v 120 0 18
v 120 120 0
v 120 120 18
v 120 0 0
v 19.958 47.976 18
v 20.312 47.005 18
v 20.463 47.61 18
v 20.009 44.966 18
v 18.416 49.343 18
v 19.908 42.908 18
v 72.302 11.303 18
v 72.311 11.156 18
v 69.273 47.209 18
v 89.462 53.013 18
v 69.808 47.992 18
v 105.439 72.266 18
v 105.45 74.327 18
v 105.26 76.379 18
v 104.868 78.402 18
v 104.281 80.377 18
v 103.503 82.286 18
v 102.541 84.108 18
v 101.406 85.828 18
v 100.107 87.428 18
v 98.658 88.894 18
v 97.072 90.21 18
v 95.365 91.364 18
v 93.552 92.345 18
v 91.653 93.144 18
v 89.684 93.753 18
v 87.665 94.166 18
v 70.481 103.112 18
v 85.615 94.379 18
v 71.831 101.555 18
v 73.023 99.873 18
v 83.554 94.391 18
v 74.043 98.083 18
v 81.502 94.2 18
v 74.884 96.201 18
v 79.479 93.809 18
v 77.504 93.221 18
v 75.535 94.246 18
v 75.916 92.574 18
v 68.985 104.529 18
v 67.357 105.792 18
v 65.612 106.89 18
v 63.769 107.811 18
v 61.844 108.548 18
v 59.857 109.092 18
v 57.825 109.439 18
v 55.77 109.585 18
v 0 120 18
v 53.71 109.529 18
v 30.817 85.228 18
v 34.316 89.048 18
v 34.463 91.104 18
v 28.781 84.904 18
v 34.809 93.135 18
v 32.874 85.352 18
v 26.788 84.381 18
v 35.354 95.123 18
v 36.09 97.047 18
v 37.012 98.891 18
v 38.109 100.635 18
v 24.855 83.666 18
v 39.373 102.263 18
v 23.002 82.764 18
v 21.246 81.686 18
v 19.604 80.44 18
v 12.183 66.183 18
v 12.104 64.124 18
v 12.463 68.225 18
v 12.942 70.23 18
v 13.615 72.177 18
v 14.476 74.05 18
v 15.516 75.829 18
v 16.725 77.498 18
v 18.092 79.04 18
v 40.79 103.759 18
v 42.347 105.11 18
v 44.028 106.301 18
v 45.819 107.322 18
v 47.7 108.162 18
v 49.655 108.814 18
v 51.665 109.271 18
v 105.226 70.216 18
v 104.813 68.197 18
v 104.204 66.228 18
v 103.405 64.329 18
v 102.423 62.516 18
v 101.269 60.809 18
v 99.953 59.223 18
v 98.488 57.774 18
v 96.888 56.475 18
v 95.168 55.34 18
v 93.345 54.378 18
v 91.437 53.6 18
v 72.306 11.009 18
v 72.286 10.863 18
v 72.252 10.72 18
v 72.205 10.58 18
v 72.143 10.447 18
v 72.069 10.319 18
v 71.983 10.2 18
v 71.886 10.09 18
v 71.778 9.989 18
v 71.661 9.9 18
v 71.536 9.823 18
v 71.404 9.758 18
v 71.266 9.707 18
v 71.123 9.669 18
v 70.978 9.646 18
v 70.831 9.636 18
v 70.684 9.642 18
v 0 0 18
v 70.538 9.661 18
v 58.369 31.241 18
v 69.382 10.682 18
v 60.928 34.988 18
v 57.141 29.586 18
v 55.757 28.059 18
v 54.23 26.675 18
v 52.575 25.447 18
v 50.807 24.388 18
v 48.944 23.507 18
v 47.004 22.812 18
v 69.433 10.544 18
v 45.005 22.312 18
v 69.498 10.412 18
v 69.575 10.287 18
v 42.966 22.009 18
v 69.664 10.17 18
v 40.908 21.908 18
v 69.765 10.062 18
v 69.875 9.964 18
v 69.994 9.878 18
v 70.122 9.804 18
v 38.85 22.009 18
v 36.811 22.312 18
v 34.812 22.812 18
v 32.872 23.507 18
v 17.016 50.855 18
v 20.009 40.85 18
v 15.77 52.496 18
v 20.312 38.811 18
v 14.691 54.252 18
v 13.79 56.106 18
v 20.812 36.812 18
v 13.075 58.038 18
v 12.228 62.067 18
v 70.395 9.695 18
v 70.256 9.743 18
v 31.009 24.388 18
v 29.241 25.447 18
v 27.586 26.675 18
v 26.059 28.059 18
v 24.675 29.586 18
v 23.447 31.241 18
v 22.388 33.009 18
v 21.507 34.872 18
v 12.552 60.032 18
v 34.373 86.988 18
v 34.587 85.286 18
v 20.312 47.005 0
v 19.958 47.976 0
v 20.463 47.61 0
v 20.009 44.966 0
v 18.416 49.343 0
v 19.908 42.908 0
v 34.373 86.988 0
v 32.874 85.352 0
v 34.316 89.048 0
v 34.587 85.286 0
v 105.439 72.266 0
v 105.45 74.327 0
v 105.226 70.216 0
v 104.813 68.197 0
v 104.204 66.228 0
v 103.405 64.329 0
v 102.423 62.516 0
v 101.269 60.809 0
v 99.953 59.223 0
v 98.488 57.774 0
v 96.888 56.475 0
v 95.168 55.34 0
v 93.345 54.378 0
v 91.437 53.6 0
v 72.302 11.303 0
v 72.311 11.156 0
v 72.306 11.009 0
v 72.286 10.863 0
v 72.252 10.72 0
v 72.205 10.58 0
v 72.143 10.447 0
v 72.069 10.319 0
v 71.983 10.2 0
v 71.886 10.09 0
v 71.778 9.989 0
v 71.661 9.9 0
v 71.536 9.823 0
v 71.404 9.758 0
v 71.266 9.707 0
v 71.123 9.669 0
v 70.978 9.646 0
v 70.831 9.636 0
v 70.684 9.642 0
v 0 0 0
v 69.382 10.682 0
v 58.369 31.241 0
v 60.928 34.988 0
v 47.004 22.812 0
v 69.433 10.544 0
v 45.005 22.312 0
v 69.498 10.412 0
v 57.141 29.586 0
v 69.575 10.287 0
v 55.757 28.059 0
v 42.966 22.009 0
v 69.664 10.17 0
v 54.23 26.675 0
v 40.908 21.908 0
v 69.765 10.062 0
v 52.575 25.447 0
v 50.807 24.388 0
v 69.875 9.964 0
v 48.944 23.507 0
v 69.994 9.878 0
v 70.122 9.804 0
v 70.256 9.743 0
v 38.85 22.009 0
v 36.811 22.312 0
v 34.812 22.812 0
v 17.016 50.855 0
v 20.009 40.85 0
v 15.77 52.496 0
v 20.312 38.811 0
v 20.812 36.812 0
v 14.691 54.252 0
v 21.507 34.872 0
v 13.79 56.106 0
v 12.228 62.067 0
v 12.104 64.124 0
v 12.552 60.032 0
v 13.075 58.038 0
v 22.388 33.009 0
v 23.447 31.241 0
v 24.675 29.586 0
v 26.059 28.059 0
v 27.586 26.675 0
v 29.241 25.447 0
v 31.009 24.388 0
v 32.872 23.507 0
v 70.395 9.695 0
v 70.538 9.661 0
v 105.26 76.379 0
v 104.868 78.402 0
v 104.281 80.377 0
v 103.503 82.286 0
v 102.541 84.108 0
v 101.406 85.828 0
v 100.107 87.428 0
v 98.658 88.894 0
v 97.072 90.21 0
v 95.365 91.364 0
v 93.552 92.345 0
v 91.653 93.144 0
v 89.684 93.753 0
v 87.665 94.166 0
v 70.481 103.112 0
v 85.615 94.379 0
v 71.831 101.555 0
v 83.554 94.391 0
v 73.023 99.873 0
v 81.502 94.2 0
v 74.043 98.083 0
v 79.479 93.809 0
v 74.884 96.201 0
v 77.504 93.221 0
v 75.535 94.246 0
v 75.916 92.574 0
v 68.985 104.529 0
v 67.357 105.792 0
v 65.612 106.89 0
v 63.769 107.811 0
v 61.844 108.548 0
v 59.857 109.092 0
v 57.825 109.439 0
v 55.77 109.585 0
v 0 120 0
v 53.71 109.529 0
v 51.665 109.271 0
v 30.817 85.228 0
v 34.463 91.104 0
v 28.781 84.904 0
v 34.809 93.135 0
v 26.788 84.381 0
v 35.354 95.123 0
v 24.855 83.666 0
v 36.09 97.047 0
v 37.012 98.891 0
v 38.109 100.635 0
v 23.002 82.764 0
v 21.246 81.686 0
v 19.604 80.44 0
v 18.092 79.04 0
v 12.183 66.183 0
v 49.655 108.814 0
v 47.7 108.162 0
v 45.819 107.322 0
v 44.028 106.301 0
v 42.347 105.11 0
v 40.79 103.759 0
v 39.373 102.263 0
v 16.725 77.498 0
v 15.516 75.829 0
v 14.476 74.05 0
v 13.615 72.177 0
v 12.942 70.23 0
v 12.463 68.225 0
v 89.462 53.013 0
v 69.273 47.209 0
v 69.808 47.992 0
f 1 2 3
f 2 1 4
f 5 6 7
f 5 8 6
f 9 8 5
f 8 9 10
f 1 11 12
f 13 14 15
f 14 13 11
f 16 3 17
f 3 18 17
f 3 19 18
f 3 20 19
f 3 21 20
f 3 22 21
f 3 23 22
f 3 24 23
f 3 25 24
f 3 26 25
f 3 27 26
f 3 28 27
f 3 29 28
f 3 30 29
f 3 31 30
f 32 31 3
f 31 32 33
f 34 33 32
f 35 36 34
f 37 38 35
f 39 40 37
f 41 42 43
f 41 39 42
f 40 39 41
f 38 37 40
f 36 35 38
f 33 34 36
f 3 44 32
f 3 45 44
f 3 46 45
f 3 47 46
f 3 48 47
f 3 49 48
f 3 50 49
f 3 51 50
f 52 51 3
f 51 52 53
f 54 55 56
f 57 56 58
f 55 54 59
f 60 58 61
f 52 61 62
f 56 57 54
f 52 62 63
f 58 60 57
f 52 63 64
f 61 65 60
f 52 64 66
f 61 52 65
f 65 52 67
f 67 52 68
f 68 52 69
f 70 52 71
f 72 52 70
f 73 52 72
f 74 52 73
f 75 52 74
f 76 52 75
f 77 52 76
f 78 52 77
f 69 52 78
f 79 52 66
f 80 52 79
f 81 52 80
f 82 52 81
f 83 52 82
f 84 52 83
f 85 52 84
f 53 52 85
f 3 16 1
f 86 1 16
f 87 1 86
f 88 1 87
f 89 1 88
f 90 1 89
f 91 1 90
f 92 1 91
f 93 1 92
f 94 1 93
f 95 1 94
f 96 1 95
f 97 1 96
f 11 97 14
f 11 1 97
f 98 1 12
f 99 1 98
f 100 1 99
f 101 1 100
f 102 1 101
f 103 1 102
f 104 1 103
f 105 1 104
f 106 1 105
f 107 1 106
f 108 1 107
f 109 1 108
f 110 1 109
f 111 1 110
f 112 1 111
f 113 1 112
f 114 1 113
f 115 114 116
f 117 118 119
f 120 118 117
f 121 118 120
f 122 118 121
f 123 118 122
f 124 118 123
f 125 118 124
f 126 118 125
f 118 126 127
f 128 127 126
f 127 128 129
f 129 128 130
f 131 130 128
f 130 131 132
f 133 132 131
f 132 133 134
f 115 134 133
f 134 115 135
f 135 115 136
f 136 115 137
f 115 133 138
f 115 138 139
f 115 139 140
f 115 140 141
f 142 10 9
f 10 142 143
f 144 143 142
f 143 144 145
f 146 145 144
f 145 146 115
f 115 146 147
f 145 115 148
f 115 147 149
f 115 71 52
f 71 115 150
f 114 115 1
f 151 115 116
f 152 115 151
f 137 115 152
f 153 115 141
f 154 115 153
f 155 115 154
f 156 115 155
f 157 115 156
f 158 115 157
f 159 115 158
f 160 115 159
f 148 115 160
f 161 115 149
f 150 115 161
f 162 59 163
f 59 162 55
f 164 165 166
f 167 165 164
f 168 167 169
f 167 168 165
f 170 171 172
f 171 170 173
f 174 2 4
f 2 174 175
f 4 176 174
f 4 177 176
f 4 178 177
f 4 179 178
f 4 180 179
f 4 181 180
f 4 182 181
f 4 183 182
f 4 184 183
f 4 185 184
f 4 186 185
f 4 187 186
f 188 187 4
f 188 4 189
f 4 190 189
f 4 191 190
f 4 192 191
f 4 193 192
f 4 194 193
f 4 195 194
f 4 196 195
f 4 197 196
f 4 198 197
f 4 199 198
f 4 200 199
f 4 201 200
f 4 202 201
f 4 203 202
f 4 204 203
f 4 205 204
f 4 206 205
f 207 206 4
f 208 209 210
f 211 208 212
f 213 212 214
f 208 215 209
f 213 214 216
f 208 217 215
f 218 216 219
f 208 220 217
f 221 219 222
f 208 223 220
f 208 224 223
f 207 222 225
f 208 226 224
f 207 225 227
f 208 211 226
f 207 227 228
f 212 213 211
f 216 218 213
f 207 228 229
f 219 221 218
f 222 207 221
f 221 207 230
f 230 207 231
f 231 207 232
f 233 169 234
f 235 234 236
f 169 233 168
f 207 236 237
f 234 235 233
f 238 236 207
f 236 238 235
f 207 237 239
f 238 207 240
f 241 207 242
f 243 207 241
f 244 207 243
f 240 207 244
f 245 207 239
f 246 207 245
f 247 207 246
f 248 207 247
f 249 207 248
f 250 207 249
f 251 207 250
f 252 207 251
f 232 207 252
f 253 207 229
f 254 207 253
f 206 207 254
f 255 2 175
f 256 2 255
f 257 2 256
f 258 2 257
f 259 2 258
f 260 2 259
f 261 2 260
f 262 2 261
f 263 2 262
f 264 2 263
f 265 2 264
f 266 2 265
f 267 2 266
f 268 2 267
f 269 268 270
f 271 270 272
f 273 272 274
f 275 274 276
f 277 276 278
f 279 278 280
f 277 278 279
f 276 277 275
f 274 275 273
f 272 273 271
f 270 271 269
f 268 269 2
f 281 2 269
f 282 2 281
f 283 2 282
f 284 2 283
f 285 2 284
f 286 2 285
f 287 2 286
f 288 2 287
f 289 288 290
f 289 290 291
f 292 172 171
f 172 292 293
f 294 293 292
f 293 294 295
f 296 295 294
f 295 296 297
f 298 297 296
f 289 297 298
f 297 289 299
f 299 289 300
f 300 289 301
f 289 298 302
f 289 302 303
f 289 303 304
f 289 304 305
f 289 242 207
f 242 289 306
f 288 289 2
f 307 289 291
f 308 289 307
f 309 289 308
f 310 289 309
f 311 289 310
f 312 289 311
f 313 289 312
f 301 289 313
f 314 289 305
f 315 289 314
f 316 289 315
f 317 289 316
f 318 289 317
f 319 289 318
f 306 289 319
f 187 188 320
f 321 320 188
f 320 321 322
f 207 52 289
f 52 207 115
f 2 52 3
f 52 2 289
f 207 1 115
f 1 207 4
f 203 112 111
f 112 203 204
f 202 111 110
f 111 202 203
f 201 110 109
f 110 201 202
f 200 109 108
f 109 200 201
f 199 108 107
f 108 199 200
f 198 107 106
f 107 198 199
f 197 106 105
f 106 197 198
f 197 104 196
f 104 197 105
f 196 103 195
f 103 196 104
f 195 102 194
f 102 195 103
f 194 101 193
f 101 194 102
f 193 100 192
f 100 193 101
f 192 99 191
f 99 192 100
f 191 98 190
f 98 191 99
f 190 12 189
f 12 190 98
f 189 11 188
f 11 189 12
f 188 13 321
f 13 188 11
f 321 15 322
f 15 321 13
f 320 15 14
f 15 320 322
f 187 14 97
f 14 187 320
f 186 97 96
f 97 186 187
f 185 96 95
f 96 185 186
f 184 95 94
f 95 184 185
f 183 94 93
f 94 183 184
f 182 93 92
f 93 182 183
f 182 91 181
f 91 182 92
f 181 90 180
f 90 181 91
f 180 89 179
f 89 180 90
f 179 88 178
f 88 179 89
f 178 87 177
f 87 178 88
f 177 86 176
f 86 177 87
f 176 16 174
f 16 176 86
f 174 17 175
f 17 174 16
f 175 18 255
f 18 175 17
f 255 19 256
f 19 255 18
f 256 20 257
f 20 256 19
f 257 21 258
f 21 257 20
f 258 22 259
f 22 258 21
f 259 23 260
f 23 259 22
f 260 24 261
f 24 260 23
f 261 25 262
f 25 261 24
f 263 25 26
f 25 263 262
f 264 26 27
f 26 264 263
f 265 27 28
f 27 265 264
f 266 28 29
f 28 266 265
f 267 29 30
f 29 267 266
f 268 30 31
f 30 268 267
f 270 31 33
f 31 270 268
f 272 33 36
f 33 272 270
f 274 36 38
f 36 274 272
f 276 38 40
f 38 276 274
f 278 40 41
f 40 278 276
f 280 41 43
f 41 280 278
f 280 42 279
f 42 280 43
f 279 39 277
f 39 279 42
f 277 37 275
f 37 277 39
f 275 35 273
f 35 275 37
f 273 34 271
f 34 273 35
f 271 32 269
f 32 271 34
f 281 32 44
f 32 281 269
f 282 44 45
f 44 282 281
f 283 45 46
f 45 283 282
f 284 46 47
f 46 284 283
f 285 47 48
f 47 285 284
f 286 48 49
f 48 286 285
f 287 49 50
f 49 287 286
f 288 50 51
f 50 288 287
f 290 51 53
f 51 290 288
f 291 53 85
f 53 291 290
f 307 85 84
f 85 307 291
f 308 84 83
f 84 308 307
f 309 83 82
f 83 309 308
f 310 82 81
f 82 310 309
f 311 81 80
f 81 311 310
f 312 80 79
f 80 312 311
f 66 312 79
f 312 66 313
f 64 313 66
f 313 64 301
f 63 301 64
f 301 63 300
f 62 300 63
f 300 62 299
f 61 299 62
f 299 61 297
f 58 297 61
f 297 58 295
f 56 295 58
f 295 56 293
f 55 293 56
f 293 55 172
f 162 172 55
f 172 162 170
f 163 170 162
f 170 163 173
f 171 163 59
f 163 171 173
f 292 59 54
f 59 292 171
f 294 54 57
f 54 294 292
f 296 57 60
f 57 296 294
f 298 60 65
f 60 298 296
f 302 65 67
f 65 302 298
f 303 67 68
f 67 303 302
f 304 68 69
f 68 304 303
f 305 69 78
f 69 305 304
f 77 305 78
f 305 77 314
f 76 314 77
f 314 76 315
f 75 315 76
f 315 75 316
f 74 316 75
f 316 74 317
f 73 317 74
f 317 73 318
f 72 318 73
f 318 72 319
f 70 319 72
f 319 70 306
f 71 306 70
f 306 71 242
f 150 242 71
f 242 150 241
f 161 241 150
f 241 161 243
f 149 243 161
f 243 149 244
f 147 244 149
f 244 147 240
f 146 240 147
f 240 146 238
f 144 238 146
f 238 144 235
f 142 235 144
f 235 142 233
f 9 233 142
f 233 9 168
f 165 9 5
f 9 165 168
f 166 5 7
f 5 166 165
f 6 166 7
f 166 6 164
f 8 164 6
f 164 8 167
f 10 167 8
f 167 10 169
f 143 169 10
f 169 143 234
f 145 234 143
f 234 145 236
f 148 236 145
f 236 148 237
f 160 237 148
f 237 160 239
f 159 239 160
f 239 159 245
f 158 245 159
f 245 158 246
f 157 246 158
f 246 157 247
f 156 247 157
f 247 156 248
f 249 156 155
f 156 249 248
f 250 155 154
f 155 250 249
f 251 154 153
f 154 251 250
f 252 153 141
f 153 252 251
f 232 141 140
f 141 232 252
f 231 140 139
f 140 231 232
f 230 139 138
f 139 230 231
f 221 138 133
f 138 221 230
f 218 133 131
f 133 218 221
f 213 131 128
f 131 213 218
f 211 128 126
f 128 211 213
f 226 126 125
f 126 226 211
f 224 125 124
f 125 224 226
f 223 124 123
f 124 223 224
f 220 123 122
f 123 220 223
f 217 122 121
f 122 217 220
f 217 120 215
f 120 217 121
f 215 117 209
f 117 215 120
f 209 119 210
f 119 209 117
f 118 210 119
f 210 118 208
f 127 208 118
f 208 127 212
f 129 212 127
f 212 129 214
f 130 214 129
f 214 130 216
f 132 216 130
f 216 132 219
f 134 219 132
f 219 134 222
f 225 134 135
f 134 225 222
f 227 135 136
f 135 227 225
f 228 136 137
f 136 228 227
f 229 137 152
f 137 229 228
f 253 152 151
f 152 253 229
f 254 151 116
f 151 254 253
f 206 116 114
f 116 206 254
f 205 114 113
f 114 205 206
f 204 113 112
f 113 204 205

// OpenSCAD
// === UNITS ===
// units: mm   (assumed — no dimensions or unit symbols are legible on the sketch)

// === PARAMETERS ===
stock_x = 120;        // overall stock size in X (left-right)
stock_y = 120;        // overall stock size in Y (front-back)
stock_z = 18;         // stock thickness (Z)

clover_cx = 60;       // clover centre X position on the stock
clover_cy = 62;       // clover centre Y position on the stock

lobe_r = 21;          // radius of each of the four round leaf lobes
lobe_dist = 27;       // distance from clover centre to each lobe centre
centre_r = 16;        // radius of the central hub that joins the lobes

lobe_a1 = 25;         // lobe 1 direction (right lobe)
lobe_a2 = 100;        // lobe 2 direction (top lobe)
lobe_a3 = 175;        // lobe 3 direction (left lobe)
lobe_a4 = 225;        // lobe 4 direction (lower-left lobe)
lobe_angles = [lobe_a1, lobe_a2, lobe_a3, lobe_a4];  // list of all lobe directions

stem_angle = -78;     // stem direction (down and slightly to the right)
stem_len = 52;        // stem length from clover centre to stem tip
stem_base_r = 8;      // stem half-width where it meets the clover centre
stem_tip_r = 1.5;     // stem half-width at the tip (nearly pointed)

overshoot = 1;        // extra depth so the profile cut clears the stock cleanly

// === ASSUMPTIONS ===
// - No dimensions or unit symbols are legible on the sketch; every value above
//   is a visual estimate taken from the drawing's proportions.
// - Units assumed to be mm (typical for a small decorative routed part).
// - Part is read as a 2.5D through-profile cut of the clover outline.
// - Stock size chosen to fully contain the clover with an even margin.
// - Lobe directions are approximate; the sketch is freehand and not symmetric.
// - The narrow V shape at the bottom is read as a tapered stem that merges
//   into the clover centre.
// - If a proper engineering drawing exists, all dimensions need verification.

// === MODEL ===
$fn = 64;

module lobe_2d(a) {
    rotate([0, 0, a])
        hull() {
            circle(r = centre_r);
            translate([lobe_dist, 0]) circle(r = lobe_r);
        }
}

module stem_2d() {
    rotate([0, 0, stem_angle])
        hull() {
            circle(r = stem_base_r);
            translate([stem_len, 0]) circle(r = stem_tip_r);
        }
}

module clover_2d() {
    for (a = lobe_angles) lobe_2d(a);
    stem_2d();
}

difference() {
    cube([stock_x, stock_y, stock_z]);
    translate([clover_cx, clover_cy, -overshoot])
        linear_extrude(height = stock_z + 2 * overshoot)
            clover_2d();
}
